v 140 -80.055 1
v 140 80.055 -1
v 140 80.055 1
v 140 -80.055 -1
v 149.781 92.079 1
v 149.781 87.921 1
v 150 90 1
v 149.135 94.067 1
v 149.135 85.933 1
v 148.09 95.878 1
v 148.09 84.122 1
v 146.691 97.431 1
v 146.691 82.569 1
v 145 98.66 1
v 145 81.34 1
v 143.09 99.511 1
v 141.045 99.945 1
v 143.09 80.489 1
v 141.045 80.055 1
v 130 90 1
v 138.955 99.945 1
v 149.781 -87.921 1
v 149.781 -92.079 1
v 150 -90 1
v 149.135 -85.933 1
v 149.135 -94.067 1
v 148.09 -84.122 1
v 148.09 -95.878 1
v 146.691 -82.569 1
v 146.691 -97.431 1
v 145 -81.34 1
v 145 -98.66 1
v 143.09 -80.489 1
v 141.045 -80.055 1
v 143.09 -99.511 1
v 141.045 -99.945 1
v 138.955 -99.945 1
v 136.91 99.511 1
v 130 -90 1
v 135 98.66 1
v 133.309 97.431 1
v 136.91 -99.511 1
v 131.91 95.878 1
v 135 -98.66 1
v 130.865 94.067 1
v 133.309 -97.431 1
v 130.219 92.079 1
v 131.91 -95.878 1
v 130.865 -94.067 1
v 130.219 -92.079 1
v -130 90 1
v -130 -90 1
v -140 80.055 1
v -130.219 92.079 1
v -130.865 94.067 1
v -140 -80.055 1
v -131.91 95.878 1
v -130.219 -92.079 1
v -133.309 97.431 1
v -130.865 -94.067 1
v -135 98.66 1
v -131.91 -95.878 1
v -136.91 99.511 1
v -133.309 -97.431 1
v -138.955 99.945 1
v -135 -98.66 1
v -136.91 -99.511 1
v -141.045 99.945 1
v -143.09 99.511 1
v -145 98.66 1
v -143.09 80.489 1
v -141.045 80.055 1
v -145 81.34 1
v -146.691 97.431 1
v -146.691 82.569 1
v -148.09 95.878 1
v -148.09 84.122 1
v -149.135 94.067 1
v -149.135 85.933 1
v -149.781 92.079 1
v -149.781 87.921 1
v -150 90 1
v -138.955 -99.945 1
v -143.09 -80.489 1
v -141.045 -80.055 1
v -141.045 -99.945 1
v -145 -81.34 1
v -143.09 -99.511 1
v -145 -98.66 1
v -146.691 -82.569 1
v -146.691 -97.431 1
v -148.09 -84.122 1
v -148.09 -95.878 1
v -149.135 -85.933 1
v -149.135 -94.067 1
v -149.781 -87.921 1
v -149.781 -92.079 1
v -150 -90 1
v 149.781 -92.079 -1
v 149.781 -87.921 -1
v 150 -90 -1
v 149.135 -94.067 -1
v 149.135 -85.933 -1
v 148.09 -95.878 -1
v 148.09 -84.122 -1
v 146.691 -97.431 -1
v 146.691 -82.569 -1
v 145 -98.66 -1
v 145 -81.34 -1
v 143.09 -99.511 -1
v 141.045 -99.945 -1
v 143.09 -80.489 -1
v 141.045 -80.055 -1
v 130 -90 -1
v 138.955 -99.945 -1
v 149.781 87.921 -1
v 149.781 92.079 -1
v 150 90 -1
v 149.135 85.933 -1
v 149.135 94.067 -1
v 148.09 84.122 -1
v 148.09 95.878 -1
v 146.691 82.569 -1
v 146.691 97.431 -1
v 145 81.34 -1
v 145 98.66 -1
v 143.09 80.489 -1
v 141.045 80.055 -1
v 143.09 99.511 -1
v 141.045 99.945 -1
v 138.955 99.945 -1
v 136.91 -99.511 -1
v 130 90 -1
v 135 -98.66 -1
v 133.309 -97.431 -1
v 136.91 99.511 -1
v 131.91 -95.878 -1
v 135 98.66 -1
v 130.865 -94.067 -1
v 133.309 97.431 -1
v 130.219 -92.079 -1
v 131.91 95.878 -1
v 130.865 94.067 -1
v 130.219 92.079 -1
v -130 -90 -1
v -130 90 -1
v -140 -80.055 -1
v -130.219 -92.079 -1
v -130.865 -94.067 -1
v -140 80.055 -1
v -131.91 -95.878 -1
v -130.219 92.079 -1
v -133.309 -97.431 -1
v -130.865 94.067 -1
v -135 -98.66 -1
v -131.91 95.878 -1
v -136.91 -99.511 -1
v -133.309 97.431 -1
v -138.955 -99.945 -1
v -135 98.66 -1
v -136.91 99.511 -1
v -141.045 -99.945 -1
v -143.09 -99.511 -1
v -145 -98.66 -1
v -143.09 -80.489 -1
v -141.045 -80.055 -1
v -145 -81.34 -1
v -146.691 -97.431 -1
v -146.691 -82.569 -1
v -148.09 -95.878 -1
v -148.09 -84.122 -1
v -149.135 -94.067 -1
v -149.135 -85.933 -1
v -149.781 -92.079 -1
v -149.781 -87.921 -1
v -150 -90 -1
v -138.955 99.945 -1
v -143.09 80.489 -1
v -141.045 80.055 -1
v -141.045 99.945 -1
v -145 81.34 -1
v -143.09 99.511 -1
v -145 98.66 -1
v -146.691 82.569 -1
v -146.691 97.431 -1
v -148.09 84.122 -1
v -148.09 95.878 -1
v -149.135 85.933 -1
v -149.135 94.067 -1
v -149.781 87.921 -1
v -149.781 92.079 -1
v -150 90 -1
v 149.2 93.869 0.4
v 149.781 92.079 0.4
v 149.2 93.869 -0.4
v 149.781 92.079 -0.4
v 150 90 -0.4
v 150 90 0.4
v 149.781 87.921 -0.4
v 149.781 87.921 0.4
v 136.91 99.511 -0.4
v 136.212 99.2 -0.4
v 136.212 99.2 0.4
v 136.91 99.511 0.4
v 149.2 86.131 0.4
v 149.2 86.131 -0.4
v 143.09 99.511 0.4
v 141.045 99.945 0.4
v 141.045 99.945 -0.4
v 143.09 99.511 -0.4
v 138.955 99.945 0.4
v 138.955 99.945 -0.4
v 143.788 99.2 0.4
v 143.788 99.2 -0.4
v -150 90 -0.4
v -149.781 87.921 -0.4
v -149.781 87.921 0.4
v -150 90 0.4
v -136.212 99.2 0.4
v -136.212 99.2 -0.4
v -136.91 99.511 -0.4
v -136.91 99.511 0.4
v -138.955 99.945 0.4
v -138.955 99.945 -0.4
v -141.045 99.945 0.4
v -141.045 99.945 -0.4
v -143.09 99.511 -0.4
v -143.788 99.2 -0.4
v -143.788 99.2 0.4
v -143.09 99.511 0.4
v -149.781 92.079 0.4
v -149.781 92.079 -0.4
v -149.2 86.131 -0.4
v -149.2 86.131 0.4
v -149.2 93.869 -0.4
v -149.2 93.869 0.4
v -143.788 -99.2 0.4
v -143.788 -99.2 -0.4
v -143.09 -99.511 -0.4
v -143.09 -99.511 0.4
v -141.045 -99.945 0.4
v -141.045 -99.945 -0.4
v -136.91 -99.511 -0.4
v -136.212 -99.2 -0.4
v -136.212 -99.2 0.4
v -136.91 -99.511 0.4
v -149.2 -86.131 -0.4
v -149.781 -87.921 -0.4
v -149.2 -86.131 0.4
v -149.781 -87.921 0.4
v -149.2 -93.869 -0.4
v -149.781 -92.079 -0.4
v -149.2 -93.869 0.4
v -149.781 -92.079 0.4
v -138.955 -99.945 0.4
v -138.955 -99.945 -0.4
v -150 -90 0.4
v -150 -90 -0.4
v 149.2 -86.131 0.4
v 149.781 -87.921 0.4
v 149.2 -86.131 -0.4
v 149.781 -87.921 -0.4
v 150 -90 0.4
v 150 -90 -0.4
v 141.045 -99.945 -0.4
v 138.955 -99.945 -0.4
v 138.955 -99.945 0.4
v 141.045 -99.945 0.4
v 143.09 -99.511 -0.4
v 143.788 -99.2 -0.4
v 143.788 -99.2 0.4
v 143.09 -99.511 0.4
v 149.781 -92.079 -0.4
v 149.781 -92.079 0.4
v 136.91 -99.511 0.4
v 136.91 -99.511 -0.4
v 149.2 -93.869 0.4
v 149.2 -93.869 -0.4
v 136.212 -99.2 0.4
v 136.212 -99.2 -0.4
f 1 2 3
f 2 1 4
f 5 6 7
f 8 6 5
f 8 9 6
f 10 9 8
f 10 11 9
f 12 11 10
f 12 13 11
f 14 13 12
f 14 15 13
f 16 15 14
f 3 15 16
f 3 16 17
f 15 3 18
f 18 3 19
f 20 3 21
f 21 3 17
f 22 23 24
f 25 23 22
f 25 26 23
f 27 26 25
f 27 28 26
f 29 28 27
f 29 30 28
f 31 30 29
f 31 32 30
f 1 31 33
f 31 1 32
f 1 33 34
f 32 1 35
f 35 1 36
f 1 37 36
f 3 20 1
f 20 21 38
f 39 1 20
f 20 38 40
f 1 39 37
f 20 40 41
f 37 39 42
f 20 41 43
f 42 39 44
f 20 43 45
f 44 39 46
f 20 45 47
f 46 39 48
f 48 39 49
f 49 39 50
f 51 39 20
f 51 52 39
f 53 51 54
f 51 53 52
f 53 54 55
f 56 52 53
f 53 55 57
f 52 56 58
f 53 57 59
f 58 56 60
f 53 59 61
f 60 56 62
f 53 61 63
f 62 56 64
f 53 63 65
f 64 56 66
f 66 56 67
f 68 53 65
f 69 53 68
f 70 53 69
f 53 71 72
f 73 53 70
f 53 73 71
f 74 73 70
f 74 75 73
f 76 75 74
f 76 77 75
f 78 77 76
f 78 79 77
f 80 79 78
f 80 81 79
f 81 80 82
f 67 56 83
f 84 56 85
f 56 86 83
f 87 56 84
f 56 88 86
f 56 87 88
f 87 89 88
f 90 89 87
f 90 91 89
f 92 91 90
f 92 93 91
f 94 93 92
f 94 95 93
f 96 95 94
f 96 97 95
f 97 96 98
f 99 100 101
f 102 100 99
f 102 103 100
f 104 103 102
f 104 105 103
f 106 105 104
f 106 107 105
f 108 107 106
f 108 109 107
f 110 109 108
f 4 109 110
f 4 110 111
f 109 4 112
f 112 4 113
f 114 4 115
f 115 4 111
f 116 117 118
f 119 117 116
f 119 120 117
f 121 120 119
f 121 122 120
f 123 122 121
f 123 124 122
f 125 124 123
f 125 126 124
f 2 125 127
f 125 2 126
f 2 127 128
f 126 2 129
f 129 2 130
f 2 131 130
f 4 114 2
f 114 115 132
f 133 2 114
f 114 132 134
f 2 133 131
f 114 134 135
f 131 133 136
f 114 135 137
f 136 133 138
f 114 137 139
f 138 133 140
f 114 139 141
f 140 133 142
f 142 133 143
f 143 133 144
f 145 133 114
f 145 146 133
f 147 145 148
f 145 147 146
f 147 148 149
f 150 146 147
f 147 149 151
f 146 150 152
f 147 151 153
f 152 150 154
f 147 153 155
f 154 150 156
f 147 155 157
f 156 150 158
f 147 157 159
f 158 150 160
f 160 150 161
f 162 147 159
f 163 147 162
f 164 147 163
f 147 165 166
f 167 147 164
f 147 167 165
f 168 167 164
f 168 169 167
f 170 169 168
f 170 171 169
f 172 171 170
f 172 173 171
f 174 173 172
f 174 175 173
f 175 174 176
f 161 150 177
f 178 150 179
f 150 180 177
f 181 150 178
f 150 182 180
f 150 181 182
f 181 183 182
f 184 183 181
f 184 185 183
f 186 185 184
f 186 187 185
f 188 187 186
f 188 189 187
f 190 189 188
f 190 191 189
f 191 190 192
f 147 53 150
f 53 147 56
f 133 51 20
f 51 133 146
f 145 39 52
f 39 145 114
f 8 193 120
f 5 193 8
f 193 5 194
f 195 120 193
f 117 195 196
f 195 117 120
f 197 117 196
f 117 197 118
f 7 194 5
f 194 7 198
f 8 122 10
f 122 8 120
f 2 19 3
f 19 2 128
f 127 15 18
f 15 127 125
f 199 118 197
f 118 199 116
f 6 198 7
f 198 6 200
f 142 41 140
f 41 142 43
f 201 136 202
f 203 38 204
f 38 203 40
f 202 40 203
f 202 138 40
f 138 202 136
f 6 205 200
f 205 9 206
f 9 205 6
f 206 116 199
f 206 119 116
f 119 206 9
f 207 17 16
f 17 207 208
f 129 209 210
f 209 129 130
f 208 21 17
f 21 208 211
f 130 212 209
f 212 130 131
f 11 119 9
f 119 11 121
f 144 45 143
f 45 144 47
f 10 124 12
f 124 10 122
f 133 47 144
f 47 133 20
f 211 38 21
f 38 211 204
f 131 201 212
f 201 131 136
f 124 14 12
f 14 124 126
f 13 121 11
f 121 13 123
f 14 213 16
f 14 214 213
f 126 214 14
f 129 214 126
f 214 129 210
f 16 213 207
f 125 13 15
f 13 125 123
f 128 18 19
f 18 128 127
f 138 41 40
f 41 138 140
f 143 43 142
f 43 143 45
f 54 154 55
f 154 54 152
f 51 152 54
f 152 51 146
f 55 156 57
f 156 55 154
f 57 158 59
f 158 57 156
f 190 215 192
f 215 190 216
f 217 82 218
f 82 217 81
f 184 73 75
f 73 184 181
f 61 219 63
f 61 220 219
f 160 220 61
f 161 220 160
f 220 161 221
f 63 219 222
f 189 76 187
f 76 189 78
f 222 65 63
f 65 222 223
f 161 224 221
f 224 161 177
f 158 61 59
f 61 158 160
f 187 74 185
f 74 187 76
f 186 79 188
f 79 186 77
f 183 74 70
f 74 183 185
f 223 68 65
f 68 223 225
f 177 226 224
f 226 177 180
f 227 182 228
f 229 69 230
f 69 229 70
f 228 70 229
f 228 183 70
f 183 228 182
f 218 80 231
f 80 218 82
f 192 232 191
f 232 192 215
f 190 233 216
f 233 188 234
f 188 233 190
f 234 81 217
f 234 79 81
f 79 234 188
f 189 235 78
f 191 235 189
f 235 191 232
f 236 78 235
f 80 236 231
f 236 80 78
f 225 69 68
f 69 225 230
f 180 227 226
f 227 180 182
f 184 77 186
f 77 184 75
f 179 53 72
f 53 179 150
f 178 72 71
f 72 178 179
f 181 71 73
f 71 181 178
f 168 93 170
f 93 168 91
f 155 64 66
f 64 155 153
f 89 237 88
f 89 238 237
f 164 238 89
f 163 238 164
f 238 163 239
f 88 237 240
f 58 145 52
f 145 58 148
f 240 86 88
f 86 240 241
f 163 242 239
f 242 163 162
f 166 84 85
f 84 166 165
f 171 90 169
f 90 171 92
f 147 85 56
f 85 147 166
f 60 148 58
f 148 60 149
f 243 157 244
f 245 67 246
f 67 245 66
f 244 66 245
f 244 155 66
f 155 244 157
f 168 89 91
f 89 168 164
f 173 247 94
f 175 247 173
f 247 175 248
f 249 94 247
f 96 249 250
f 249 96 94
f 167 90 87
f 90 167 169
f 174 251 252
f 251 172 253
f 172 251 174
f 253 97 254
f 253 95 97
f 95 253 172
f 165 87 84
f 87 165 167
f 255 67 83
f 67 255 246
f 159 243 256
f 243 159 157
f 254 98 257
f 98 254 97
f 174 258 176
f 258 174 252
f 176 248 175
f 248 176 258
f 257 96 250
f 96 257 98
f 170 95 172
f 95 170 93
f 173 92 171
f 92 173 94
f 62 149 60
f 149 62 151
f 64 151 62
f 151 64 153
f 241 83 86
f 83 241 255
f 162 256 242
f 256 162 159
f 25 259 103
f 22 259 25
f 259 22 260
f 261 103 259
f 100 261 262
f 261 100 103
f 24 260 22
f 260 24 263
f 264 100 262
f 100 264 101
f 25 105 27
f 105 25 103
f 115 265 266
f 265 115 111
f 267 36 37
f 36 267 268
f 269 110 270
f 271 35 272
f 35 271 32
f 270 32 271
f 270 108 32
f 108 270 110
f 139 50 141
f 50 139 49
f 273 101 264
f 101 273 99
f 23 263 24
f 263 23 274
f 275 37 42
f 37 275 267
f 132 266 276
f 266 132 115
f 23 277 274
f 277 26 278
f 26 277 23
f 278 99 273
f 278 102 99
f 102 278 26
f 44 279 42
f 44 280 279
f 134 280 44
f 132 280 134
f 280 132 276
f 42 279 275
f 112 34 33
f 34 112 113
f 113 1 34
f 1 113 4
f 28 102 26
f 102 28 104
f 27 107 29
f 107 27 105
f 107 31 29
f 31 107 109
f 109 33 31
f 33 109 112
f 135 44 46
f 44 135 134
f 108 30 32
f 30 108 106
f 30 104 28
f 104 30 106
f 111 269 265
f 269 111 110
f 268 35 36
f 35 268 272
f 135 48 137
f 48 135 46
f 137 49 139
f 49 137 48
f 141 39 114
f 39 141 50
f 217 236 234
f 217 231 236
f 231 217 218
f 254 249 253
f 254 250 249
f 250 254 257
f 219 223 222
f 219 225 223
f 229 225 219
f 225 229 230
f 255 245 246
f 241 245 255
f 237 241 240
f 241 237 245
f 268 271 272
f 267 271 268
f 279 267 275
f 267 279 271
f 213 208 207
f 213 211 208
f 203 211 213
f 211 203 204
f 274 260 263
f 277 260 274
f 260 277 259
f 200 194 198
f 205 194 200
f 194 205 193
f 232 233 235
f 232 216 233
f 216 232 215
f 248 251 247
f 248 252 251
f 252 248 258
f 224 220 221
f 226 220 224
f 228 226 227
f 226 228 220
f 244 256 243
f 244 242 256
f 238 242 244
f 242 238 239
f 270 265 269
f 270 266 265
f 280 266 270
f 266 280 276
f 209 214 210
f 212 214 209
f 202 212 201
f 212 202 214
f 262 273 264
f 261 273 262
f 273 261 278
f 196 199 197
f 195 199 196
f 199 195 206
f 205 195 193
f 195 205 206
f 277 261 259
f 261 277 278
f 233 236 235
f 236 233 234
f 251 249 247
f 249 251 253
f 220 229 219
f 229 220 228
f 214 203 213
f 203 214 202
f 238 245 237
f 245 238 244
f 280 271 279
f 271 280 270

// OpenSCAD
// Parameters
sheet_length = 300; //[150:600:1]
sheet_width = 200; //[100:400:1]
sheet_thickness = 2; //[1:6:0.5]
corner_radius = 10; //[2:25:1]
chamfer_size = 0.8; //[0.2:2:0.1]
op_overlap = 1; //[0.5:2:0.1]
texture_depth = 0; //[0:0.5:0.05]

// Base Shapes
module sheet_plate() {
  cube([sheet_length, sheet_width, sheet_thickness], center=true);
}

module rounded_corners_core() {
  cube([sheet_length - 2*corner_radius, sheet_width - 2*corner_radius, sheet_thickness], center=true);
}

module rounded_corners_cyl(pos) {
  translate(pos)
    cylinder(r=corner_radius, h=sheet_thickness, center=true);
}

module chamfer_edges_top_cut() {
  cube([sheet_length + 2*op_overlap, sheet_width + 2*op_overlap, chamfer_size], center=true);
}

module chamfer_edges_top_keep() {
  cube([sheet_length - 2*chamfer_size, sheet_width - 2*chamfer_size, chamfer_size + 2*op_overlap], center=true);
}

module chamfer_edges_bottom_cut() {
  cube([sheet_length + 2*op_overlap, sheet_width + 2*op_overlap, chamfer_size], center=true);
}

module chamfer_edges_bottom_keep() {
  cube([sheet_length - 2*chamfer_size, sheet_width - 2*chamfer_size, chamfer_size + 2*op_overlap], center=true);
}

module surface_texture_weave() {
  cube([sheet_length, sheet_width, texture_depth], center=true);
}

// Operations
module rounded_corners() {
  union() {
    rounded_corners_core();
    rounded_corners_cyl([sheet_length/2 - corner_radius, sheet_width/2 - corner_radius, 0]);
    rounded_corners_cyl([-sheet_length/2 + corner_radius, sheet_width/2 - corner_radius, 0]);
    rounded_corners_cyl([-sheet_length/2 + corner_radius, -sheet_width/2 + corner_radius, 0]);
    rounded_corners_cyl([sheet_length/2 - corner_radius, -sheet_width/2 + corner_radius, 0]);
  }
}

module chamfer_edges_top_ring() {
  difference() {
    chamfer_edges_top_cut();
    chamfer_edges_top_keep();
  }
}

module chamfer_edges_bottom_ring() {
  difference() {
    chamfer_edges_bottom_cut();
    chamfer_edges_bottom_keep();
  }
}

module chamfer_edges() {
  union() {
    chamfer_edges_top_ring();
    chamfer_edges_bottom_ring();
  }
}

module sheet_with_rounded_corners() {
  intersection() {
    sheet_plate();
    rounded_corners();
  }
}

module sheet_with_rounded_and_chamfered() {
  difference() {
    sheet_with_rounded_corners();
    chamfer_edges();
  }
}

// Final Output
module complete_model() {
  union() {
    sheet_with_rounded_and_chamfered();
    surface_texture_weave();
  }
}

// Render the complete model
color([0.15, 0.15, 0.15]) complete_model();
